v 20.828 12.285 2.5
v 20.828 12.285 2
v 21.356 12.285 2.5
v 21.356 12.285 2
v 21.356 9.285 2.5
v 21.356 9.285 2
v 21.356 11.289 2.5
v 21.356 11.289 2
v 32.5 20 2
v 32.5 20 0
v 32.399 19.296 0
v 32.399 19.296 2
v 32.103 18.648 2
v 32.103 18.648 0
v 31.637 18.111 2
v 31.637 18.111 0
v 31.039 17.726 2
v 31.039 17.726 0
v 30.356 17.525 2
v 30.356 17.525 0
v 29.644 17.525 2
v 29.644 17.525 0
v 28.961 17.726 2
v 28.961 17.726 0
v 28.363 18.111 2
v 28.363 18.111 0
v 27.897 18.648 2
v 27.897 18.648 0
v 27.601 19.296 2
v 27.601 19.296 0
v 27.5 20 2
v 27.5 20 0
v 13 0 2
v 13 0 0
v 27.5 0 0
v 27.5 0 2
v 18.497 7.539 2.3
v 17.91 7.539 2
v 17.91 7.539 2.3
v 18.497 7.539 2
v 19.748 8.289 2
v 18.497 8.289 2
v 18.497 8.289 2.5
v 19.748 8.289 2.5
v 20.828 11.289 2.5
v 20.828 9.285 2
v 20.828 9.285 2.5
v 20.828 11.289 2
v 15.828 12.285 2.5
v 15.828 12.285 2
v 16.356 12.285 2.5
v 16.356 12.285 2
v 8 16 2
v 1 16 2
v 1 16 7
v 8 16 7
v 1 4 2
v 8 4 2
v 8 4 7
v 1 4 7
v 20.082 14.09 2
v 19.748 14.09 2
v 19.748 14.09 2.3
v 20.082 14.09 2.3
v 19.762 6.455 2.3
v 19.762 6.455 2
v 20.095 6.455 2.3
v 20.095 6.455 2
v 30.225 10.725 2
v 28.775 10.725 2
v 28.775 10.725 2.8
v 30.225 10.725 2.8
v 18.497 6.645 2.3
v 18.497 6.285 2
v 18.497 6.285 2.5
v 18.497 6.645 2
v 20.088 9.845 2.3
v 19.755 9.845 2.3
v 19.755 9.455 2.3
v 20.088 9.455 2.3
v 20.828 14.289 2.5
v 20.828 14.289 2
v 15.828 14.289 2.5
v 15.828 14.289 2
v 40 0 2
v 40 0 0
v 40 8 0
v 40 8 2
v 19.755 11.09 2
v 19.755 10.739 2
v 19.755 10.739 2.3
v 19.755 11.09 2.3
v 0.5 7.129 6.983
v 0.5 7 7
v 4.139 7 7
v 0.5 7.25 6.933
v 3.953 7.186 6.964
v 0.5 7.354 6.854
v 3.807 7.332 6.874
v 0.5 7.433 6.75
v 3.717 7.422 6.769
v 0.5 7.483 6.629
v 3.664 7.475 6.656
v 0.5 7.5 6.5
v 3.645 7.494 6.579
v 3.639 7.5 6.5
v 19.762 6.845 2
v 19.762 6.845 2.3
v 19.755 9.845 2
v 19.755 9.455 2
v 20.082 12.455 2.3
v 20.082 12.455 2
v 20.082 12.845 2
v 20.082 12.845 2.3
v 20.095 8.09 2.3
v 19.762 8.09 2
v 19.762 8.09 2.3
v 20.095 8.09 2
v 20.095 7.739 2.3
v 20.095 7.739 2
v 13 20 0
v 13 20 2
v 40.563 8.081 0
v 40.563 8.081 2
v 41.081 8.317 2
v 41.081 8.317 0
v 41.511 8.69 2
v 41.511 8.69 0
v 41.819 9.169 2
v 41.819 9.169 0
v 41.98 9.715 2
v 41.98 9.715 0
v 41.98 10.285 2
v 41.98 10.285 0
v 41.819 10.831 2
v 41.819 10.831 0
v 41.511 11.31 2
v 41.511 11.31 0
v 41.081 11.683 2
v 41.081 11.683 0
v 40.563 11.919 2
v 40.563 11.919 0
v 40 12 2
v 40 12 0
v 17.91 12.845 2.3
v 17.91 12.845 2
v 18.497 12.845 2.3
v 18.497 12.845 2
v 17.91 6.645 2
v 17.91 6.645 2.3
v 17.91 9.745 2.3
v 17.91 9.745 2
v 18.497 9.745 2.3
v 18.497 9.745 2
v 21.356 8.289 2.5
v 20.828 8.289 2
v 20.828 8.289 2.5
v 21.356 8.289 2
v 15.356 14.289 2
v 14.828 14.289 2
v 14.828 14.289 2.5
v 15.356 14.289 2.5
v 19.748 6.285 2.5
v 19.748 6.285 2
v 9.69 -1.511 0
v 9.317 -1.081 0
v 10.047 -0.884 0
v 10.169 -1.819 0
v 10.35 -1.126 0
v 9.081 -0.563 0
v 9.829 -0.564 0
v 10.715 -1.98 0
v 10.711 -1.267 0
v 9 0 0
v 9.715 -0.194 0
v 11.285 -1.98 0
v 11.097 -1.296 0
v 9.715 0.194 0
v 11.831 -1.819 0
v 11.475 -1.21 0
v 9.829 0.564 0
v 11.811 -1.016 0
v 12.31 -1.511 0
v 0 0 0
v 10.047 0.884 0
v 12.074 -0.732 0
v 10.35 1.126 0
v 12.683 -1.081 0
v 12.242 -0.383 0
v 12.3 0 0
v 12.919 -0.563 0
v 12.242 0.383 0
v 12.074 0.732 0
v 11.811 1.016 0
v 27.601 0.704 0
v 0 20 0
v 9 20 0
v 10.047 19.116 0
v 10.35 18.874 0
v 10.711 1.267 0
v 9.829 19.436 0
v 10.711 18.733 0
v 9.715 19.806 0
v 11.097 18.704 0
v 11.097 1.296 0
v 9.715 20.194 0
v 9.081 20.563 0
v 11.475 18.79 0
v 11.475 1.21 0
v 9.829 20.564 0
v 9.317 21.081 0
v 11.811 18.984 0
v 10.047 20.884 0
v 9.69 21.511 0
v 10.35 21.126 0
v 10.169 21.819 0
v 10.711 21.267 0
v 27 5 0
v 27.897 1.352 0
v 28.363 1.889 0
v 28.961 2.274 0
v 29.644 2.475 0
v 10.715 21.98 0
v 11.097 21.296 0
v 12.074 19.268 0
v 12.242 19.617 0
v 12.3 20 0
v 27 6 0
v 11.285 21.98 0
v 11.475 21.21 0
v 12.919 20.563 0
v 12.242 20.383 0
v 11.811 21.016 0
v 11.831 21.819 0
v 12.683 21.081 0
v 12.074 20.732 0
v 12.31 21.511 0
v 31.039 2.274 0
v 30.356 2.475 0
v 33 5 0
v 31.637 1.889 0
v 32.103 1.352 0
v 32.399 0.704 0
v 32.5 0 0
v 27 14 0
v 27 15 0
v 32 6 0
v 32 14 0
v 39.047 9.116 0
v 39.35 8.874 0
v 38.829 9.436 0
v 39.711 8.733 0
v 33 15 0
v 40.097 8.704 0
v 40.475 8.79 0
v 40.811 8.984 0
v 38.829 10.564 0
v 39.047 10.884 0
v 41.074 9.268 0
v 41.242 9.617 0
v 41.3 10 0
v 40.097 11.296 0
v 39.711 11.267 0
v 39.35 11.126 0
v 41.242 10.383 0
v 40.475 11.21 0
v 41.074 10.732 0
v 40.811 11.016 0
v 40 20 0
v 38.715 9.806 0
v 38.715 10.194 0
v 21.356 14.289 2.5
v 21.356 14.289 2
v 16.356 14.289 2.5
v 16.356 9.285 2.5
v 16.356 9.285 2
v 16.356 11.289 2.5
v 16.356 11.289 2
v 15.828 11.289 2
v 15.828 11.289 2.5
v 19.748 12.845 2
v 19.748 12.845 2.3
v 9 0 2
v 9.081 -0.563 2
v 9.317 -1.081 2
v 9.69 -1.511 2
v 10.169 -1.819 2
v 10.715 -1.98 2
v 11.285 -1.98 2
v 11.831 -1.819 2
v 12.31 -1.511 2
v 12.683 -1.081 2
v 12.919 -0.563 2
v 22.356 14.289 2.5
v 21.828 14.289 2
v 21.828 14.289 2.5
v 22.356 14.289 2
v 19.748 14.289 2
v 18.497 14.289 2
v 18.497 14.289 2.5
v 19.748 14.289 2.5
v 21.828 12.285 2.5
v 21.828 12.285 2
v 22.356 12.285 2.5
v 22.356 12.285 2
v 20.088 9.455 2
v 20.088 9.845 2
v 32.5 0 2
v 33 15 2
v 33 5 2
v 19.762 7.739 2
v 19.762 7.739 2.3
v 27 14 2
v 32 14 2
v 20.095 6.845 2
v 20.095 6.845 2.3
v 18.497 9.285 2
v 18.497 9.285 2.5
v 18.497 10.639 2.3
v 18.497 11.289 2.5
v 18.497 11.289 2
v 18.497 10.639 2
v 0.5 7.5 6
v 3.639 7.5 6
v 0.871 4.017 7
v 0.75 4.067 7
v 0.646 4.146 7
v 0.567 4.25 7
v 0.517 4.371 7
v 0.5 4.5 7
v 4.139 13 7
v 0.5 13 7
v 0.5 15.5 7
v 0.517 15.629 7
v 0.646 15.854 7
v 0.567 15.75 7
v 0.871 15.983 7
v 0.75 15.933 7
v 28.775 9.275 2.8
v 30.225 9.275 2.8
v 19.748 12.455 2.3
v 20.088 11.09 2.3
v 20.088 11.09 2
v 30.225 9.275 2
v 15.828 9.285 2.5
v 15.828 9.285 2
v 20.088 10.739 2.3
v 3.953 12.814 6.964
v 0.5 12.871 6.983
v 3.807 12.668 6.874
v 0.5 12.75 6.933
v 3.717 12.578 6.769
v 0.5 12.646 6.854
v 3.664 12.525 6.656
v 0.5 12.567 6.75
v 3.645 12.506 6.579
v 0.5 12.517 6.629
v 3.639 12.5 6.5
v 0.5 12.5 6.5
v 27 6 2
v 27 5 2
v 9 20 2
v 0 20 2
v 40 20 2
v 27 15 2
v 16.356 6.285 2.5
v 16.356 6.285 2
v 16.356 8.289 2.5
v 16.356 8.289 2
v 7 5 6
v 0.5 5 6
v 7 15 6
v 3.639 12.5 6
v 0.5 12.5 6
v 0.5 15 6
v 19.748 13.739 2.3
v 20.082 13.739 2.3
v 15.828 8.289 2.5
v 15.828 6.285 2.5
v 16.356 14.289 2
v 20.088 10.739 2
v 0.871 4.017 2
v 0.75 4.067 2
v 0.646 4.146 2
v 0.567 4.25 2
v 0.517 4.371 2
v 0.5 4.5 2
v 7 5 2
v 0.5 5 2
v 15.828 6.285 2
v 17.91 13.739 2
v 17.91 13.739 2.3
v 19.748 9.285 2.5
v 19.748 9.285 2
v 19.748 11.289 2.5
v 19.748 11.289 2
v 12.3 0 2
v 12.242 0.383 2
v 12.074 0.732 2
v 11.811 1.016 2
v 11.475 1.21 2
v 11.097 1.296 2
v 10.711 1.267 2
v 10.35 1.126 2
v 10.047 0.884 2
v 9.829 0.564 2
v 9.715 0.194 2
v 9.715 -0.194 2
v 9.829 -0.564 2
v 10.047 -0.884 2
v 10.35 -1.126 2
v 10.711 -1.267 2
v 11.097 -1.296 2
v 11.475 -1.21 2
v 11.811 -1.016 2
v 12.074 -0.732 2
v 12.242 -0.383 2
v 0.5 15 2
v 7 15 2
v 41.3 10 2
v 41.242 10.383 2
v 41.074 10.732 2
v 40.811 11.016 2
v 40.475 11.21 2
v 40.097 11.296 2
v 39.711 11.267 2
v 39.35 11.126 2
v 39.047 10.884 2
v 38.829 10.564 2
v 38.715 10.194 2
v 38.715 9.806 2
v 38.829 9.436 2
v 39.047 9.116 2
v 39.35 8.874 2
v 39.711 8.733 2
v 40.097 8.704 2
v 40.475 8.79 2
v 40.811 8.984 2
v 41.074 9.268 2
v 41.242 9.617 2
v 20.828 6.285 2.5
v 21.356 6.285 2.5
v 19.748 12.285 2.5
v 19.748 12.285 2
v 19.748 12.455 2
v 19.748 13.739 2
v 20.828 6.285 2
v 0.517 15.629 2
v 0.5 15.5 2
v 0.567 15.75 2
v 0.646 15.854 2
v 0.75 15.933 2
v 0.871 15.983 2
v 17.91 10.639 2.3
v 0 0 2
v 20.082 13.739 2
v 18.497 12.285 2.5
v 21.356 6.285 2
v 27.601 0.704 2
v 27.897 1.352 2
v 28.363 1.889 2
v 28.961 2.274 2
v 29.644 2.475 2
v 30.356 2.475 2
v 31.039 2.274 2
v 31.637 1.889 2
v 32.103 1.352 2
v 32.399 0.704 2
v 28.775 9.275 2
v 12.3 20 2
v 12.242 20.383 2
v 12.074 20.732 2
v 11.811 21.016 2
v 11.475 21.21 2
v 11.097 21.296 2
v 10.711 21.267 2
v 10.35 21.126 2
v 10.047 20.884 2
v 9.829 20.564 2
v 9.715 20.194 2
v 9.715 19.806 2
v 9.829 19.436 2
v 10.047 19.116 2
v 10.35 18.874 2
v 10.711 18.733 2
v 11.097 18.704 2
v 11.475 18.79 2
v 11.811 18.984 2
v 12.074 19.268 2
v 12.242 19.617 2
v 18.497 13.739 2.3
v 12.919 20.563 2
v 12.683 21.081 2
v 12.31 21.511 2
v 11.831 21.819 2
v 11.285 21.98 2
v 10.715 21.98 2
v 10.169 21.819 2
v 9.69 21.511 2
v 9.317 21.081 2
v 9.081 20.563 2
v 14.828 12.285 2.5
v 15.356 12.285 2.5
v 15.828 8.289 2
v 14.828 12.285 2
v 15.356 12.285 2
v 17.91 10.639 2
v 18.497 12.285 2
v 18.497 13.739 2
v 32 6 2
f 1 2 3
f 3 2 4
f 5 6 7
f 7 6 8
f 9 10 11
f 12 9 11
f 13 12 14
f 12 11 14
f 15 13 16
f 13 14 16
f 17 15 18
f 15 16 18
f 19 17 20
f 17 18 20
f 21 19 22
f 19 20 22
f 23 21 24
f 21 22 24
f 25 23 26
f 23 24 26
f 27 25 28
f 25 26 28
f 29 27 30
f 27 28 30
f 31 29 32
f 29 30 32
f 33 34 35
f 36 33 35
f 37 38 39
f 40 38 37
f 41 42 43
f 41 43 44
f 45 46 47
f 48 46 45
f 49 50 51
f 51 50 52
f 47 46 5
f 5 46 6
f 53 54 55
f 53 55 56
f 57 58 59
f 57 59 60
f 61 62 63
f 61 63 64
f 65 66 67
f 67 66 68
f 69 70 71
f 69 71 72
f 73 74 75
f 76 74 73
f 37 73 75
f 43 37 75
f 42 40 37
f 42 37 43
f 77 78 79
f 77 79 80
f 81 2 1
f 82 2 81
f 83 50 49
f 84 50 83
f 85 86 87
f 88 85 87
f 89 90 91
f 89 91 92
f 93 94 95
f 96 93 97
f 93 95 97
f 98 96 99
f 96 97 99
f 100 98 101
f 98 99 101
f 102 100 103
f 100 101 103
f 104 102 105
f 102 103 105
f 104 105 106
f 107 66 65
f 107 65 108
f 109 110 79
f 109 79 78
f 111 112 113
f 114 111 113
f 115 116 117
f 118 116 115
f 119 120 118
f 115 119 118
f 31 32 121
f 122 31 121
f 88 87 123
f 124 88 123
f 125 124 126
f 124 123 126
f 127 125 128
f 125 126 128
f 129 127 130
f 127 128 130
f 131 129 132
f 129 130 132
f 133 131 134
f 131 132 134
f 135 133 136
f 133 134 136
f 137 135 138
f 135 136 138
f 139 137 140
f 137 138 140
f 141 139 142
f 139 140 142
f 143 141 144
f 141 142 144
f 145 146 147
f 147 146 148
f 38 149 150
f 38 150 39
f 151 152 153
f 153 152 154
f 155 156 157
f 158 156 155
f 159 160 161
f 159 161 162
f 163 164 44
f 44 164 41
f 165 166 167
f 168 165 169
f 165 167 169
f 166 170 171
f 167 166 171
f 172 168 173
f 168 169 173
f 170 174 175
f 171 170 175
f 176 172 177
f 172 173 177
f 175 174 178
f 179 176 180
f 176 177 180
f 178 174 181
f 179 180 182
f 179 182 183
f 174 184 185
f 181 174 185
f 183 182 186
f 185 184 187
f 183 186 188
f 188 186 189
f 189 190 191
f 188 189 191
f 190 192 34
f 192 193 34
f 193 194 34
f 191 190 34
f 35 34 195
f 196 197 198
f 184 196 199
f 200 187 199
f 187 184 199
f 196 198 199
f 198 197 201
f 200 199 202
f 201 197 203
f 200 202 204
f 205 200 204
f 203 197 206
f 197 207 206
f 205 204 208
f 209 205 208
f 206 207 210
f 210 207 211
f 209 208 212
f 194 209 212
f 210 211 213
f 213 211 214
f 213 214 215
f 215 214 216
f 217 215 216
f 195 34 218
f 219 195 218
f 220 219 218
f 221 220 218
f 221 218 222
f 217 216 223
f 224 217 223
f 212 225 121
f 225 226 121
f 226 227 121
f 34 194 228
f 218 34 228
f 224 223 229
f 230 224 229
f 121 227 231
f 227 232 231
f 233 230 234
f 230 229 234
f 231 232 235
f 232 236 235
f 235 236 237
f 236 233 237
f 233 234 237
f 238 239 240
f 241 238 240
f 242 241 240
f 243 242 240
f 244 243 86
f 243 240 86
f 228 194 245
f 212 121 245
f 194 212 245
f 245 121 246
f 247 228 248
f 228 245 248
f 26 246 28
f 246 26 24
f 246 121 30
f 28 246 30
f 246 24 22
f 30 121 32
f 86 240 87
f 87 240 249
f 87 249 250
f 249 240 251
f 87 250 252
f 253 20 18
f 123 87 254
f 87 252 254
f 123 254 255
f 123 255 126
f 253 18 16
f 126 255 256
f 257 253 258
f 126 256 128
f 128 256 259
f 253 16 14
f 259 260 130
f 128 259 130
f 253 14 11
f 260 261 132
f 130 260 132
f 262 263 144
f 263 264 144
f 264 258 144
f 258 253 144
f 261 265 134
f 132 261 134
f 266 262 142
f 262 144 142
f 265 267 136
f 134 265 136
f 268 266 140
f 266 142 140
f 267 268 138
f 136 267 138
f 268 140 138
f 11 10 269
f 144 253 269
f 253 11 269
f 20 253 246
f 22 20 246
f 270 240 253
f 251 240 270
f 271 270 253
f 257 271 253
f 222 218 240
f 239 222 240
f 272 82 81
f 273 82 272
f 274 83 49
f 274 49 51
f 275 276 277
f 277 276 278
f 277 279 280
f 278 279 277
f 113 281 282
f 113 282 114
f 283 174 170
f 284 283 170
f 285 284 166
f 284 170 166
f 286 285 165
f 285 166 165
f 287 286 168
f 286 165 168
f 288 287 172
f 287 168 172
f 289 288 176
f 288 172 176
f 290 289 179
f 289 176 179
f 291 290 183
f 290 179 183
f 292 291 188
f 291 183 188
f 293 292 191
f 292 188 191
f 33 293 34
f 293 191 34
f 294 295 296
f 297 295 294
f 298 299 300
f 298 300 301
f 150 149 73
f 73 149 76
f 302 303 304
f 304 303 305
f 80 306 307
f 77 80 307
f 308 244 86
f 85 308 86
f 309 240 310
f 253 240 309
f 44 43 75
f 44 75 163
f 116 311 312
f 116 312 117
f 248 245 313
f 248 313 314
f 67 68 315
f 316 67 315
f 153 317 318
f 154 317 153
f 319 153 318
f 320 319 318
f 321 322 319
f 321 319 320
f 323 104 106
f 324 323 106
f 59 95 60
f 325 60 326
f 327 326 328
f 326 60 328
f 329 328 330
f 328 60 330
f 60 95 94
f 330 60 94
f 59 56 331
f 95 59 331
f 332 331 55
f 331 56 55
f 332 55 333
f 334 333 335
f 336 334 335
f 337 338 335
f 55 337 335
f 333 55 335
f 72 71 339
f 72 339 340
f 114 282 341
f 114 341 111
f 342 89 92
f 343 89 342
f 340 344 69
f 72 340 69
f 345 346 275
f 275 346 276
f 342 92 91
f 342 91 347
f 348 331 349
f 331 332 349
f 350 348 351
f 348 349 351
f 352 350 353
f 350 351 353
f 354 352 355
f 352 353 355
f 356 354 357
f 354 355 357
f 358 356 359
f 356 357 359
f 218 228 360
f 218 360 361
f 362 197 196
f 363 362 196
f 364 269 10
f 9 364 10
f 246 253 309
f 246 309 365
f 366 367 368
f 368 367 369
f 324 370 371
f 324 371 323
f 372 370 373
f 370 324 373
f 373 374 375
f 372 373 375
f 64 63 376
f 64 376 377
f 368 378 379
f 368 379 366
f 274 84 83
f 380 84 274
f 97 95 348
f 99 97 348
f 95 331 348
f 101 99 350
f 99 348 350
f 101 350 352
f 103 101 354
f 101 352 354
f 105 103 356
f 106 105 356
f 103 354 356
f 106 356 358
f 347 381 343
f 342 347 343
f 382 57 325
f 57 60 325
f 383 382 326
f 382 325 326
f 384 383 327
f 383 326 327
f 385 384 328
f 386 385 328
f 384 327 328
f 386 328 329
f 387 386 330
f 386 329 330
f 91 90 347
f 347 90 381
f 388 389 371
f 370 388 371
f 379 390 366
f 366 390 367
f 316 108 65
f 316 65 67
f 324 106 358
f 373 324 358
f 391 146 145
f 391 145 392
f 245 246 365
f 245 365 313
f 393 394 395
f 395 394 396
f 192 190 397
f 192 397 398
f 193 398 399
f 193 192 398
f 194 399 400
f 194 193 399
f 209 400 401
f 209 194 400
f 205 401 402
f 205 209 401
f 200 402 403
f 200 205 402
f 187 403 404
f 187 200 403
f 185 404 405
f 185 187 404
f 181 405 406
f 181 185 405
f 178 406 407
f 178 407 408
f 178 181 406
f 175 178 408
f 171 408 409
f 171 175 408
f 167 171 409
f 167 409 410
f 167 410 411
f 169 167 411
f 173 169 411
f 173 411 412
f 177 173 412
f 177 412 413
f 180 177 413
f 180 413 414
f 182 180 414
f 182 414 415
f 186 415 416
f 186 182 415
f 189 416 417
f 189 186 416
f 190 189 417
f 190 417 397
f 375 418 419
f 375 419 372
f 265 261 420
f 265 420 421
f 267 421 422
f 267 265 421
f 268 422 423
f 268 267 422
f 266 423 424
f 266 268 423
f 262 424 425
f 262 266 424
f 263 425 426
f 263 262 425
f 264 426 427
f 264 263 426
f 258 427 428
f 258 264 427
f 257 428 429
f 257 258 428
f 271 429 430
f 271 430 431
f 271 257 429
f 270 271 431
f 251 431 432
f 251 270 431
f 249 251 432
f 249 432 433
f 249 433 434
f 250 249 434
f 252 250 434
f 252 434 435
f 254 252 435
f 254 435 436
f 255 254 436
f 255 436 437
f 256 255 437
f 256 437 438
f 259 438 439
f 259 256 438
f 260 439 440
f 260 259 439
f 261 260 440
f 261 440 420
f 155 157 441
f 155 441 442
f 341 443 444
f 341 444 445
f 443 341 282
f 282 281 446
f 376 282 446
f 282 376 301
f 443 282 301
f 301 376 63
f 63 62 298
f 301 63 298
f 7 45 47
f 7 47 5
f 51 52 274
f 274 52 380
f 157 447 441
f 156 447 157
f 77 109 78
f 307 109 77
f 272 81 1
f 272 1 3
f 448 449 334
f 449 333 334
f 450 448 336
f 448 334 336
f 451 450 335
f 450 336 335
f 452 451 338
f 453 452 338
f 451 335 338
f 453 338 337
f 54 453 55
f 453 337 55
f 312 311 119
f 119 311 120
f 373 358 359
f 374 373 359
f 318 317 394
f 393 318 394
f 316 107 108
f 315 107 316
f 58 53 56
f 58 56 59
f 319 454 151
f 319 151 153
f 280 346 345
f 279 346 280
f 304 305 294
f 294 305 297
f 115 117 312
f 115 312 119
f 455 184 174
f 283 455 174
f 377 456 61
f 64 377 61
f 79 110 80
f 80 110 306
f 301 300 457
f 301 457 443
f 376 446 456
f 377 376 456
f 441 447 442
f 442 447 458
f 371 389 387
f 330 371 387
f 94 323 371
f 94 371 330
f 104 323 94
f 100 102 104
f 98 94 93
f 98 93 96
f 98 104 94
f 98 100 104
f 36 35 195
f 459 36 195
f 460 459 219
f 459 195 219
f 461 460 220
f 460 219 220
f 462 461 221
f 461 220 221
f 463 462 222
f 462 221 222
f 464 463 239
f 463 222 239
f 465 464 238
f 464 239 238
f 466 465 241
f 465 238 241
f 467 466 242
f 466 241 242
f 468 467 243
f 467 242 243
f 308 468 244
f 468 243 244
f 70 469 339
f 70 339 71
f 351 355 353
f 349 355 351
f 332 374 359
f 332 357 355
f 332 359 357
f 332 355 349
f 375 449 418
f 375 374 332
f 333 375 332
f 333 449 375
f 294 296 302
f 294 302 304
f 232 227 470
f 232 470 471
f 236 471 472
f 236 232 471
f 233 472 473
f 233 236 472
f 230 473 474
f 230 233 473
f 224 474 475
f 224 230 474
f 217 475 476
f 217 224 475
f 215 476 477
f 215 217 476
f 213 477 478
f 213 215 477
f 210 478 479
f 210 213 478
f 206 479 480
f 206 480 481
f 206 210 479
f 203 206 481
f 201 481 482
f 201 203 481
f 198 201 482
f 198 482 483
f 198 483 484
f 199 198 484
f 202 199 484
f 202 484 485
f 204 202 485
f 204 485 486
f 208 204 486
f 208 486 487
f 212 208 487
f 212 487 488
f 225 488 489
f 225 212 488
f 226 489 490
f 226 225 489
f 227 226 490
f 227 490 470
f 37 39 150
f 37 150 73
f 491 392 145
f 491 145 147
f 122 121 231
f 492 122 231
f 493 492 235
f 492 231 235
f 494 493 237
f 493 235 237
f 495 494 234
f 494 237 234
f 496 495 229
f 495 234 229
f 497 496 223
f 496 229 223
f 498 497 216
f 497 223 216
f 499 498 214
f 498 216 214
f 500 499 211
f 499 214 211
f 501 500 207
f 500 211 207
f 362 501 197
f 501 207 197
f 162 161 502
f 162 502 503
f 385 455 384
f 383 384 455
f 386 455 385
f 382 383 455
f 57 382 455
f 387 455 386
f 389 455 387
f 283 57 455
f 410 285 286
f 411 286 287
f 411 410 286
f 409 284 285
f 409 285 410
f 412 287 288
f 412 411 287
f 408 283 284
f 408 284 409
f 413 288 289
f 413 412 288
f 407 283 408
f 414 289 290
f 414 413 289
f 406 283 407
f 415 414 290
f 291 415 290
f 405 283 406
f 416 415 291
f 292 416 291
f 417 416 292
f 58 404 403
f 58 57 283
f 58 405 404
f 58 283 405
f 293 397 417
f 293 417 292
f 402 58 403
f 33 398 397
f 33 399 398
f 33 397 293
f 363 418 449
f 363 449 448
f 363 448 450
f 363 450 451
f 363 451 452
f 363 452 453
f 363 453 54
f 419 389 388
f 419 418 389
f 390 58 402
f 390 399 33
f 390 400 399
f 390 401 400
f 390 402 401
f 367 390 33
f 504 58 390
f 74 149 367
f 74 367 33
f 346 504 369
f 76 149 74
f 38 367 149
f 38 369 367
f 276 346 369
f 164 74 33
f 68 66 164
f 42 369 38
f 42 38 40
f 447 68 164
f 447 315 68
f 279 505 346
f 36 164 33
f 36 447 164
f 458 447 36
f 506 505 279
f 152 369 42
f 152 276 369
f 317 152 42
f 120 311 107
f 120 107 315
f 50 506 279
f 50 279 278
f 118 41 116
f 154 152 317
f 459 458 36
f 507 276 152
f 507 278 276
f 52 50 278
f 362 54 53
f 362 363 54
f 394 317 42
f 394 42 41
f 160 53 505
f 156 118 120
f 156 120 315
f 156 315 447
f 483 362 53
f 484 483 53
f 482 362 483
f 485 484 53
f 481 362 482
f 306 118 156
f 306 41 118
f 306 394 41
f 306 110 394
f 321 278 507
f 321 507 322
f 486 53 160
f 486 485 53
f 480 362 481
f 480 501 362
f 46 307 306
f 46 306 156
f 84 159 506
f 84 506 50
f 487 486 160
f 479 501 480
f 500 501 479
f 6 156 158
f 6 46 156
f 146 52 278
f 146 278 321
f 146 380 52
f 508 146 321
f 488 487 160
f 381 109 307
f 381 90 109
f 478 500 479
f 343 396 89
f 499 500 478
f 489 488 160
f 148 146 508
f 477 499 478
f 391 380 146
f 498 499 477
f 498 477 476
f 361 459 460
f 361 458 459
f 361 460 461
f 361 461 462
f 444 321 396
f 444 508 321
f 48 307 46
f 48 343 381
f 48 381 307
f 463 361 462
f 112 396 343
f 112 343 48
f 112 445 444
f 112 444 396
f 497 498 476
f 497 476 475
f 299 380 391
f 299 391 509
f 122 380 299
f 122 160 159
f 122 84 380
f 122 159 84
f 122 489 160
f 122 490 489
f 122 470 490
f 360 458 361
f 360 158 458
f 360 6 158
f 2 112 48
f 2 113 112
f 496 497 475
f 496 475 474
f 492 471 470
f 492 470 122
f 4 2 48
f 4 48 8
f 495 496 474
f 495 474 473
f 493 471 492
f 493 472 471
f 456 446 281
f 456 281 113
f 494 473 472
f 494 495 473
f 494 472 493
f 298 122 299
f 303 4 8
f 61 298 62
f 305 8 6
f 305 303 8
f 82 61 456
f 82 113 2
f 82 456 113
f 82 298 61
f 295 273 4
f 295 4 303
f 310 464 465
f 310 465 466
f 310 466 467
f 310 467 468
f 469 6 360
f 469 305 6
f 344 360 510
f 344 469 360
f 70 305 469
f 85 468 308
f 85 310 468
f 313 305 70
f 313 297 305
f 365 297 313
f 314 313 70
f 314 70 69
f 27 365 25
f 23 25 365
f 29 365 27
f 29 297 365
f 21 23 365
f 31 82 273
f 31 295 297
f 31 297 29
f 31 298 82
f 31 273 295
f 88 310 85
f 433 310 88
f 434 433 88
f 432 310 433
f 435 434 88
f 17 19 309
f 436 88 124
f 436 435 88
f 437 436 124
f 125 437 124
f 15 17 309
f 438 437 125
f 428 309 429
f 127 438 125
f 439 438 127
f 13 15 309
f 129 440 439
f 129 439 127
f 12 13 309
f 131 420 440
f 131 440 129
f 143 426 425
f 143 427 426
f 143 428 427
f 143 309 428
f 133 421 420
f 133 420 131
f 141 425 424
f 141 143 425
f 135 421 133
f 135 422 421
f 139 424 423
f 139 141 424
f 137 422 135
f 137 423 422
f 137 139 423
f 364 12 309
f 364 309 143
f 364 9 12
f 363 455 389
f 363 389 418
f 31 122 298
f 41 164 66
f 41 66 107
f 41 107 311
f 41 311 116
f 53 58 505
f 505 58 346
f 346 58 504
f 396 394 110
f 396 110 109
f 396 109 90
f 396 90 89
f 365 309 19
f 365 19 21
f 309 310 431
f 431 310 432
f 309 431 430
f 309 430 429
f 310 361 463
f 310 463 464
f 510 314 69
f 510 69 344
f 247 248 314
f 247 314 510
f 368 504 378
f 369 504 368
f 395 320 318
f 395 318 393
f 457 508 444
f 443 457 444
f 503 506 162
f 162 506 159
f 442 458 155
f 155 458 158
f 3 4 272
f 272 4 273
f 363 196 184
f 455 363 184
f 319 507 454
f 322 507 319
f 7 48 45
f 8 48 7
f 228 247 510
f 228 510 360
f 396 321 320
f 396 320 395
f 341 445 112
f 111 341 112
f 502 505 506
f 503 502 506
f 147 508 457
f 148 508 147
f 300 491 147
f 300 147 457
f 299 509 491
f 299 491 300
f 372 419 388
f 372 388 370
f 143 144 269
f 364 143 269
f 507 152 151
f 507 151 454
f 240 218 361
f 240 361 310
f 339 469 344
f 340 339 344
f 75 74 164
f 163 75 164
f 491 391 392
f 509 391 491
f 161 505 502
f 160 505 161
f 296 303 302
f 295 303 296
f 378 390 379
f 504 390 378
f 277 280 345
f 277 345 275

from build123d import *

# Parameters (mm, degrees)
SKETCH1_R           = 1.3
BOSS_EXTRUDE1_DEPTH = 2
BOSS_EXTRUDE2_DEPTH = 5
SKETCH3_W           = 4
SKETCH3_H           = 10
CUT_EXTRUDE1_DEPTH  = 7
SKETCH4_W           = 5
SKETCH4_H           = 12
CUT_EXTRUDE2_DEPTH  = 0.5
CUT_EXTRUDE3_DEPTH  = 1.5
FILLET1_R           = 0.5
SKETCH6_W           = 1.450763296
SKETCH6_H           = 1.450763296
BOSS_EXTRUDE3_DEPTH = 0.8
SKETCH7_W           = 0.528041157
SKETCH7_H           = 2.003611801
BOSS_EXTRUDE4_DEPTH = 0.5
SKETCH8_W           = 1.250632541
SKETCH8_H           = 2.003611801
BOSS_EXTRUDE5_DEPTH = 0.5
SKETCH9_W           = 0.587023474
SKETCH9_H           = 0.894026868
SKETCH9_W_2         = 0.333695167
SKETCH9_H_2         = 0.350698787
SKETCH9_W_3         = 0.333695166
SKETCH9_H_3         = 0.390012219
SKETCH9_H_4         = 0.39001222
SKETCH9_H_5         = 0.350698788
BOSS_EXTRUDE6_DEPTH = 0.3


with BuildPart() as part:
    # Sketch1 → Boss-Extrude1 (new body)
    with BuildSketch(Plane.XY):
        with BuildLine():
            Line((0, 0), (9, 0))
            ThreePointArc((9, 0), (11, -2), (13, 0))
            Line((13, 0), (27.5, 0))
            ThreePointArc((27.5, 0), (30, 2.5), (32.5, 0))
            Line((32.5, 0), (40, 0))
            Line((40, 0), (40, 8))
            ThreePointArc((40, 8), (42, 10), (40, 12))
            Line((40, 12), (40, 20))
            Line((40, 20), (32.5, 20))
            ThreePointArc((32.5, 20), (30, 17.5), (27.5, 20))
            Line((27.5, 20), (13, 20))
            ThreePointArc((13, 20), (11, 22), (9, 20))
            Line((9, 20), (0, 20))
            Line((0, 20), (0, 0))
        make_face()
        with Locations((11, 20)):
            Circle(SKETCH1_R, mode=Mode.SUBTRACT)
        with Locations((11, 0)):
            Circle(SKETCH1_R, mode=Mode.SUBTRACT)
        with Locations((40, 10)):
            Circle(SKETCH1_R, mode=Mode.SUBTRACT)
        Polygon((33, 15), (27, 15), (27, 14), (32, 14), (32, 6), (27, 6), (27, 5), (33, 5), align=None, mode=Mode.SUBTRACT)
    extrude(amount=BOSS_EXTRUDE1_DEPTH)

    # Sketch2 → Boss-Extrude2 (add)
    with BuildSketch(Plane.XY.offset(2)):
        Polygon((0, 10), (0, 16), (8, 16), (8, 4), (0, 4), align=None)
    extrude(amount=BOSS_EXTRUDE2_DEPTH)

    # Sketch3 → Cut-Extrude1 (cut)
    with BuildSketch(Plane.ZY):
        with Locations((4, 10)):
            Rectangle(SKETCH3_W, SKETCH3_H)
    extrude(amount=-CUT_EXTRUDE1_DEPTH, mode=Mode.SUBTRACT)

    # Sketch4 → Cut-Extrude2 (cut)
    with BuildSketch(Plane.ZY):
        with Locations((4.5, 10)):
            Rectangle(SKETCH4_W, SKETCH4_H)
    extrude(amount=-CUT_EXTRUDE2_DEPTH, mode=Mode.SUBTRACT)

    # Sketch5 → Cut-Extrude3 (cut)
    with BuildSketch(Plane.XY.offset(7)):
        Polygon((3.638822155, 12.5), (0.5, 12.5), (0.5, 10), (0.5, 7.5), (3.638822155, 7.5), align=None)
    extrude(amount=-CUT_EXTRUDE3_DEPTH, mode=Mode.SUBTRACT)

    # Fillet1
    fillet1_edges = [part.edges().sort_by_distance(p)[0] for p in [
        (0.5, 4, 4.5),
        (0.5, 16, 4.5),
        (2.069411077, 7.5, 7),
        (3.638822155, 10, 7),
        (2.069411077, 12.5, 7),
    ]]
    fillet(fillet1_edges, radius=FILLET1_R)

    # Sketch6 → Boss-Extrude3 (add)
    with BuildSketch(Plane.XY.offset(2)):
        with Locations((29.5, 10)):
            Rectangle(SKETCH6_W, SKETCH6_H)
    extrude(amount=BOSS_EXTRUDE3_DEPTH)

    # Sketch7 → Boss-Extrude4 (add)
    with BuildSketch(Plane.XY.offset(2)):
        with Locations((16.091644497, 13.2872497)):
            Rectangle(SKETCH7_W, SKETCH7_H)
        with Locations((15.091644497, 13.2872497)):
            Rectangle(SKETCH7_W, SKETCH7_H)
        with Locations((16.091644497, 10.2872497)):
            Rectangle(SKETCH7_W, SKETCH7_H)
        with Locations((16.091644497, 7.2872497)):
            Rectangle(SKETCH7_W, SKETCH7_H)
        with Locations((22.091644497, 13.2872497)):
            Rectangle(SKETCH7_W, SKETCH7_H)
        with Locations((21.091644497, 13.2872497)):
            Rectangle(SKETCH7_W, SKETCH7_H)
        with Locations((21.091644497, 10.2872497)):
            Rectangle(SKETCH7_W, SKETCH7_H)
        with Locations((21.091644497, 7.2872497)):
            Rectangle(SKETCH7_W, SKETCH7_H)
    extrude(amount=BOSS_EXTRUDE4_DEPTH)

    # Sketch8 → Boss-Extrude5 (add)
    with BuildSketch(Plane.XY.offset(2)):
        with Locations((19.1224917, 10.2872497)):
            Rectangle(SKETCH8_W, SKETCH8_H)
        with Locations((19.1224917, 13.2872497)):
            Rectangle(SKETCH8_W, SKETCH8_H)
        with Locations((19.1224917, 7.2872497)):
            Rectangle(SKETCH8_W, SKETCH8_H)
    extrude(amount=BOSS_EXTRUDE5_DEPTH)

    # Sketch9 → Boss-Extrude6 (add)
    with BuildSketch(Plane.XY.offset(2)):
        with Locations((18.203663692, 13.292407159)):
            Rectangle(SKETCH9_W, SKETCH9_H)
        with Locations((18.203663692, 10.192407159)):
            Rectangle(SKETCH9_W, SKETCH9_H)
        with Locations((18.203663692, 7.092407159)):
            Rectangle(SKETCH9_W, SKETCH9_H)
        with Locations((19.914655554, 13.914769987)):
            Rectangle(SKETCH9_W_2, SKETCH9_H_2)
        with Locations((19.921649724, 9.650395769)):
            Rectangle(SKETCH9_W_3, SKETCH9_H_3)
        with Locations((19.914655554, 12.650387615)):
            Rectangle(SKETCH9_W_2, SKETCH9_H_4)
        with Locations((19.921649724, 10.91477814)):
            Rectangle(SKETCH9_W_3, SKETCH9_H_5)
        with Locations((19.928643894, 6.650403922)):
            Rectangle(SKETCH9_W_3, SKETCH9_H_3)
        with Locations((19.928643894, 7.914786293)):
            Rectangle(SKETCH9_W_3, SKETCH9_H_5)
    extrude(amount=BOSS_EXTRUDE6_DEPTH)


solid = part.part
